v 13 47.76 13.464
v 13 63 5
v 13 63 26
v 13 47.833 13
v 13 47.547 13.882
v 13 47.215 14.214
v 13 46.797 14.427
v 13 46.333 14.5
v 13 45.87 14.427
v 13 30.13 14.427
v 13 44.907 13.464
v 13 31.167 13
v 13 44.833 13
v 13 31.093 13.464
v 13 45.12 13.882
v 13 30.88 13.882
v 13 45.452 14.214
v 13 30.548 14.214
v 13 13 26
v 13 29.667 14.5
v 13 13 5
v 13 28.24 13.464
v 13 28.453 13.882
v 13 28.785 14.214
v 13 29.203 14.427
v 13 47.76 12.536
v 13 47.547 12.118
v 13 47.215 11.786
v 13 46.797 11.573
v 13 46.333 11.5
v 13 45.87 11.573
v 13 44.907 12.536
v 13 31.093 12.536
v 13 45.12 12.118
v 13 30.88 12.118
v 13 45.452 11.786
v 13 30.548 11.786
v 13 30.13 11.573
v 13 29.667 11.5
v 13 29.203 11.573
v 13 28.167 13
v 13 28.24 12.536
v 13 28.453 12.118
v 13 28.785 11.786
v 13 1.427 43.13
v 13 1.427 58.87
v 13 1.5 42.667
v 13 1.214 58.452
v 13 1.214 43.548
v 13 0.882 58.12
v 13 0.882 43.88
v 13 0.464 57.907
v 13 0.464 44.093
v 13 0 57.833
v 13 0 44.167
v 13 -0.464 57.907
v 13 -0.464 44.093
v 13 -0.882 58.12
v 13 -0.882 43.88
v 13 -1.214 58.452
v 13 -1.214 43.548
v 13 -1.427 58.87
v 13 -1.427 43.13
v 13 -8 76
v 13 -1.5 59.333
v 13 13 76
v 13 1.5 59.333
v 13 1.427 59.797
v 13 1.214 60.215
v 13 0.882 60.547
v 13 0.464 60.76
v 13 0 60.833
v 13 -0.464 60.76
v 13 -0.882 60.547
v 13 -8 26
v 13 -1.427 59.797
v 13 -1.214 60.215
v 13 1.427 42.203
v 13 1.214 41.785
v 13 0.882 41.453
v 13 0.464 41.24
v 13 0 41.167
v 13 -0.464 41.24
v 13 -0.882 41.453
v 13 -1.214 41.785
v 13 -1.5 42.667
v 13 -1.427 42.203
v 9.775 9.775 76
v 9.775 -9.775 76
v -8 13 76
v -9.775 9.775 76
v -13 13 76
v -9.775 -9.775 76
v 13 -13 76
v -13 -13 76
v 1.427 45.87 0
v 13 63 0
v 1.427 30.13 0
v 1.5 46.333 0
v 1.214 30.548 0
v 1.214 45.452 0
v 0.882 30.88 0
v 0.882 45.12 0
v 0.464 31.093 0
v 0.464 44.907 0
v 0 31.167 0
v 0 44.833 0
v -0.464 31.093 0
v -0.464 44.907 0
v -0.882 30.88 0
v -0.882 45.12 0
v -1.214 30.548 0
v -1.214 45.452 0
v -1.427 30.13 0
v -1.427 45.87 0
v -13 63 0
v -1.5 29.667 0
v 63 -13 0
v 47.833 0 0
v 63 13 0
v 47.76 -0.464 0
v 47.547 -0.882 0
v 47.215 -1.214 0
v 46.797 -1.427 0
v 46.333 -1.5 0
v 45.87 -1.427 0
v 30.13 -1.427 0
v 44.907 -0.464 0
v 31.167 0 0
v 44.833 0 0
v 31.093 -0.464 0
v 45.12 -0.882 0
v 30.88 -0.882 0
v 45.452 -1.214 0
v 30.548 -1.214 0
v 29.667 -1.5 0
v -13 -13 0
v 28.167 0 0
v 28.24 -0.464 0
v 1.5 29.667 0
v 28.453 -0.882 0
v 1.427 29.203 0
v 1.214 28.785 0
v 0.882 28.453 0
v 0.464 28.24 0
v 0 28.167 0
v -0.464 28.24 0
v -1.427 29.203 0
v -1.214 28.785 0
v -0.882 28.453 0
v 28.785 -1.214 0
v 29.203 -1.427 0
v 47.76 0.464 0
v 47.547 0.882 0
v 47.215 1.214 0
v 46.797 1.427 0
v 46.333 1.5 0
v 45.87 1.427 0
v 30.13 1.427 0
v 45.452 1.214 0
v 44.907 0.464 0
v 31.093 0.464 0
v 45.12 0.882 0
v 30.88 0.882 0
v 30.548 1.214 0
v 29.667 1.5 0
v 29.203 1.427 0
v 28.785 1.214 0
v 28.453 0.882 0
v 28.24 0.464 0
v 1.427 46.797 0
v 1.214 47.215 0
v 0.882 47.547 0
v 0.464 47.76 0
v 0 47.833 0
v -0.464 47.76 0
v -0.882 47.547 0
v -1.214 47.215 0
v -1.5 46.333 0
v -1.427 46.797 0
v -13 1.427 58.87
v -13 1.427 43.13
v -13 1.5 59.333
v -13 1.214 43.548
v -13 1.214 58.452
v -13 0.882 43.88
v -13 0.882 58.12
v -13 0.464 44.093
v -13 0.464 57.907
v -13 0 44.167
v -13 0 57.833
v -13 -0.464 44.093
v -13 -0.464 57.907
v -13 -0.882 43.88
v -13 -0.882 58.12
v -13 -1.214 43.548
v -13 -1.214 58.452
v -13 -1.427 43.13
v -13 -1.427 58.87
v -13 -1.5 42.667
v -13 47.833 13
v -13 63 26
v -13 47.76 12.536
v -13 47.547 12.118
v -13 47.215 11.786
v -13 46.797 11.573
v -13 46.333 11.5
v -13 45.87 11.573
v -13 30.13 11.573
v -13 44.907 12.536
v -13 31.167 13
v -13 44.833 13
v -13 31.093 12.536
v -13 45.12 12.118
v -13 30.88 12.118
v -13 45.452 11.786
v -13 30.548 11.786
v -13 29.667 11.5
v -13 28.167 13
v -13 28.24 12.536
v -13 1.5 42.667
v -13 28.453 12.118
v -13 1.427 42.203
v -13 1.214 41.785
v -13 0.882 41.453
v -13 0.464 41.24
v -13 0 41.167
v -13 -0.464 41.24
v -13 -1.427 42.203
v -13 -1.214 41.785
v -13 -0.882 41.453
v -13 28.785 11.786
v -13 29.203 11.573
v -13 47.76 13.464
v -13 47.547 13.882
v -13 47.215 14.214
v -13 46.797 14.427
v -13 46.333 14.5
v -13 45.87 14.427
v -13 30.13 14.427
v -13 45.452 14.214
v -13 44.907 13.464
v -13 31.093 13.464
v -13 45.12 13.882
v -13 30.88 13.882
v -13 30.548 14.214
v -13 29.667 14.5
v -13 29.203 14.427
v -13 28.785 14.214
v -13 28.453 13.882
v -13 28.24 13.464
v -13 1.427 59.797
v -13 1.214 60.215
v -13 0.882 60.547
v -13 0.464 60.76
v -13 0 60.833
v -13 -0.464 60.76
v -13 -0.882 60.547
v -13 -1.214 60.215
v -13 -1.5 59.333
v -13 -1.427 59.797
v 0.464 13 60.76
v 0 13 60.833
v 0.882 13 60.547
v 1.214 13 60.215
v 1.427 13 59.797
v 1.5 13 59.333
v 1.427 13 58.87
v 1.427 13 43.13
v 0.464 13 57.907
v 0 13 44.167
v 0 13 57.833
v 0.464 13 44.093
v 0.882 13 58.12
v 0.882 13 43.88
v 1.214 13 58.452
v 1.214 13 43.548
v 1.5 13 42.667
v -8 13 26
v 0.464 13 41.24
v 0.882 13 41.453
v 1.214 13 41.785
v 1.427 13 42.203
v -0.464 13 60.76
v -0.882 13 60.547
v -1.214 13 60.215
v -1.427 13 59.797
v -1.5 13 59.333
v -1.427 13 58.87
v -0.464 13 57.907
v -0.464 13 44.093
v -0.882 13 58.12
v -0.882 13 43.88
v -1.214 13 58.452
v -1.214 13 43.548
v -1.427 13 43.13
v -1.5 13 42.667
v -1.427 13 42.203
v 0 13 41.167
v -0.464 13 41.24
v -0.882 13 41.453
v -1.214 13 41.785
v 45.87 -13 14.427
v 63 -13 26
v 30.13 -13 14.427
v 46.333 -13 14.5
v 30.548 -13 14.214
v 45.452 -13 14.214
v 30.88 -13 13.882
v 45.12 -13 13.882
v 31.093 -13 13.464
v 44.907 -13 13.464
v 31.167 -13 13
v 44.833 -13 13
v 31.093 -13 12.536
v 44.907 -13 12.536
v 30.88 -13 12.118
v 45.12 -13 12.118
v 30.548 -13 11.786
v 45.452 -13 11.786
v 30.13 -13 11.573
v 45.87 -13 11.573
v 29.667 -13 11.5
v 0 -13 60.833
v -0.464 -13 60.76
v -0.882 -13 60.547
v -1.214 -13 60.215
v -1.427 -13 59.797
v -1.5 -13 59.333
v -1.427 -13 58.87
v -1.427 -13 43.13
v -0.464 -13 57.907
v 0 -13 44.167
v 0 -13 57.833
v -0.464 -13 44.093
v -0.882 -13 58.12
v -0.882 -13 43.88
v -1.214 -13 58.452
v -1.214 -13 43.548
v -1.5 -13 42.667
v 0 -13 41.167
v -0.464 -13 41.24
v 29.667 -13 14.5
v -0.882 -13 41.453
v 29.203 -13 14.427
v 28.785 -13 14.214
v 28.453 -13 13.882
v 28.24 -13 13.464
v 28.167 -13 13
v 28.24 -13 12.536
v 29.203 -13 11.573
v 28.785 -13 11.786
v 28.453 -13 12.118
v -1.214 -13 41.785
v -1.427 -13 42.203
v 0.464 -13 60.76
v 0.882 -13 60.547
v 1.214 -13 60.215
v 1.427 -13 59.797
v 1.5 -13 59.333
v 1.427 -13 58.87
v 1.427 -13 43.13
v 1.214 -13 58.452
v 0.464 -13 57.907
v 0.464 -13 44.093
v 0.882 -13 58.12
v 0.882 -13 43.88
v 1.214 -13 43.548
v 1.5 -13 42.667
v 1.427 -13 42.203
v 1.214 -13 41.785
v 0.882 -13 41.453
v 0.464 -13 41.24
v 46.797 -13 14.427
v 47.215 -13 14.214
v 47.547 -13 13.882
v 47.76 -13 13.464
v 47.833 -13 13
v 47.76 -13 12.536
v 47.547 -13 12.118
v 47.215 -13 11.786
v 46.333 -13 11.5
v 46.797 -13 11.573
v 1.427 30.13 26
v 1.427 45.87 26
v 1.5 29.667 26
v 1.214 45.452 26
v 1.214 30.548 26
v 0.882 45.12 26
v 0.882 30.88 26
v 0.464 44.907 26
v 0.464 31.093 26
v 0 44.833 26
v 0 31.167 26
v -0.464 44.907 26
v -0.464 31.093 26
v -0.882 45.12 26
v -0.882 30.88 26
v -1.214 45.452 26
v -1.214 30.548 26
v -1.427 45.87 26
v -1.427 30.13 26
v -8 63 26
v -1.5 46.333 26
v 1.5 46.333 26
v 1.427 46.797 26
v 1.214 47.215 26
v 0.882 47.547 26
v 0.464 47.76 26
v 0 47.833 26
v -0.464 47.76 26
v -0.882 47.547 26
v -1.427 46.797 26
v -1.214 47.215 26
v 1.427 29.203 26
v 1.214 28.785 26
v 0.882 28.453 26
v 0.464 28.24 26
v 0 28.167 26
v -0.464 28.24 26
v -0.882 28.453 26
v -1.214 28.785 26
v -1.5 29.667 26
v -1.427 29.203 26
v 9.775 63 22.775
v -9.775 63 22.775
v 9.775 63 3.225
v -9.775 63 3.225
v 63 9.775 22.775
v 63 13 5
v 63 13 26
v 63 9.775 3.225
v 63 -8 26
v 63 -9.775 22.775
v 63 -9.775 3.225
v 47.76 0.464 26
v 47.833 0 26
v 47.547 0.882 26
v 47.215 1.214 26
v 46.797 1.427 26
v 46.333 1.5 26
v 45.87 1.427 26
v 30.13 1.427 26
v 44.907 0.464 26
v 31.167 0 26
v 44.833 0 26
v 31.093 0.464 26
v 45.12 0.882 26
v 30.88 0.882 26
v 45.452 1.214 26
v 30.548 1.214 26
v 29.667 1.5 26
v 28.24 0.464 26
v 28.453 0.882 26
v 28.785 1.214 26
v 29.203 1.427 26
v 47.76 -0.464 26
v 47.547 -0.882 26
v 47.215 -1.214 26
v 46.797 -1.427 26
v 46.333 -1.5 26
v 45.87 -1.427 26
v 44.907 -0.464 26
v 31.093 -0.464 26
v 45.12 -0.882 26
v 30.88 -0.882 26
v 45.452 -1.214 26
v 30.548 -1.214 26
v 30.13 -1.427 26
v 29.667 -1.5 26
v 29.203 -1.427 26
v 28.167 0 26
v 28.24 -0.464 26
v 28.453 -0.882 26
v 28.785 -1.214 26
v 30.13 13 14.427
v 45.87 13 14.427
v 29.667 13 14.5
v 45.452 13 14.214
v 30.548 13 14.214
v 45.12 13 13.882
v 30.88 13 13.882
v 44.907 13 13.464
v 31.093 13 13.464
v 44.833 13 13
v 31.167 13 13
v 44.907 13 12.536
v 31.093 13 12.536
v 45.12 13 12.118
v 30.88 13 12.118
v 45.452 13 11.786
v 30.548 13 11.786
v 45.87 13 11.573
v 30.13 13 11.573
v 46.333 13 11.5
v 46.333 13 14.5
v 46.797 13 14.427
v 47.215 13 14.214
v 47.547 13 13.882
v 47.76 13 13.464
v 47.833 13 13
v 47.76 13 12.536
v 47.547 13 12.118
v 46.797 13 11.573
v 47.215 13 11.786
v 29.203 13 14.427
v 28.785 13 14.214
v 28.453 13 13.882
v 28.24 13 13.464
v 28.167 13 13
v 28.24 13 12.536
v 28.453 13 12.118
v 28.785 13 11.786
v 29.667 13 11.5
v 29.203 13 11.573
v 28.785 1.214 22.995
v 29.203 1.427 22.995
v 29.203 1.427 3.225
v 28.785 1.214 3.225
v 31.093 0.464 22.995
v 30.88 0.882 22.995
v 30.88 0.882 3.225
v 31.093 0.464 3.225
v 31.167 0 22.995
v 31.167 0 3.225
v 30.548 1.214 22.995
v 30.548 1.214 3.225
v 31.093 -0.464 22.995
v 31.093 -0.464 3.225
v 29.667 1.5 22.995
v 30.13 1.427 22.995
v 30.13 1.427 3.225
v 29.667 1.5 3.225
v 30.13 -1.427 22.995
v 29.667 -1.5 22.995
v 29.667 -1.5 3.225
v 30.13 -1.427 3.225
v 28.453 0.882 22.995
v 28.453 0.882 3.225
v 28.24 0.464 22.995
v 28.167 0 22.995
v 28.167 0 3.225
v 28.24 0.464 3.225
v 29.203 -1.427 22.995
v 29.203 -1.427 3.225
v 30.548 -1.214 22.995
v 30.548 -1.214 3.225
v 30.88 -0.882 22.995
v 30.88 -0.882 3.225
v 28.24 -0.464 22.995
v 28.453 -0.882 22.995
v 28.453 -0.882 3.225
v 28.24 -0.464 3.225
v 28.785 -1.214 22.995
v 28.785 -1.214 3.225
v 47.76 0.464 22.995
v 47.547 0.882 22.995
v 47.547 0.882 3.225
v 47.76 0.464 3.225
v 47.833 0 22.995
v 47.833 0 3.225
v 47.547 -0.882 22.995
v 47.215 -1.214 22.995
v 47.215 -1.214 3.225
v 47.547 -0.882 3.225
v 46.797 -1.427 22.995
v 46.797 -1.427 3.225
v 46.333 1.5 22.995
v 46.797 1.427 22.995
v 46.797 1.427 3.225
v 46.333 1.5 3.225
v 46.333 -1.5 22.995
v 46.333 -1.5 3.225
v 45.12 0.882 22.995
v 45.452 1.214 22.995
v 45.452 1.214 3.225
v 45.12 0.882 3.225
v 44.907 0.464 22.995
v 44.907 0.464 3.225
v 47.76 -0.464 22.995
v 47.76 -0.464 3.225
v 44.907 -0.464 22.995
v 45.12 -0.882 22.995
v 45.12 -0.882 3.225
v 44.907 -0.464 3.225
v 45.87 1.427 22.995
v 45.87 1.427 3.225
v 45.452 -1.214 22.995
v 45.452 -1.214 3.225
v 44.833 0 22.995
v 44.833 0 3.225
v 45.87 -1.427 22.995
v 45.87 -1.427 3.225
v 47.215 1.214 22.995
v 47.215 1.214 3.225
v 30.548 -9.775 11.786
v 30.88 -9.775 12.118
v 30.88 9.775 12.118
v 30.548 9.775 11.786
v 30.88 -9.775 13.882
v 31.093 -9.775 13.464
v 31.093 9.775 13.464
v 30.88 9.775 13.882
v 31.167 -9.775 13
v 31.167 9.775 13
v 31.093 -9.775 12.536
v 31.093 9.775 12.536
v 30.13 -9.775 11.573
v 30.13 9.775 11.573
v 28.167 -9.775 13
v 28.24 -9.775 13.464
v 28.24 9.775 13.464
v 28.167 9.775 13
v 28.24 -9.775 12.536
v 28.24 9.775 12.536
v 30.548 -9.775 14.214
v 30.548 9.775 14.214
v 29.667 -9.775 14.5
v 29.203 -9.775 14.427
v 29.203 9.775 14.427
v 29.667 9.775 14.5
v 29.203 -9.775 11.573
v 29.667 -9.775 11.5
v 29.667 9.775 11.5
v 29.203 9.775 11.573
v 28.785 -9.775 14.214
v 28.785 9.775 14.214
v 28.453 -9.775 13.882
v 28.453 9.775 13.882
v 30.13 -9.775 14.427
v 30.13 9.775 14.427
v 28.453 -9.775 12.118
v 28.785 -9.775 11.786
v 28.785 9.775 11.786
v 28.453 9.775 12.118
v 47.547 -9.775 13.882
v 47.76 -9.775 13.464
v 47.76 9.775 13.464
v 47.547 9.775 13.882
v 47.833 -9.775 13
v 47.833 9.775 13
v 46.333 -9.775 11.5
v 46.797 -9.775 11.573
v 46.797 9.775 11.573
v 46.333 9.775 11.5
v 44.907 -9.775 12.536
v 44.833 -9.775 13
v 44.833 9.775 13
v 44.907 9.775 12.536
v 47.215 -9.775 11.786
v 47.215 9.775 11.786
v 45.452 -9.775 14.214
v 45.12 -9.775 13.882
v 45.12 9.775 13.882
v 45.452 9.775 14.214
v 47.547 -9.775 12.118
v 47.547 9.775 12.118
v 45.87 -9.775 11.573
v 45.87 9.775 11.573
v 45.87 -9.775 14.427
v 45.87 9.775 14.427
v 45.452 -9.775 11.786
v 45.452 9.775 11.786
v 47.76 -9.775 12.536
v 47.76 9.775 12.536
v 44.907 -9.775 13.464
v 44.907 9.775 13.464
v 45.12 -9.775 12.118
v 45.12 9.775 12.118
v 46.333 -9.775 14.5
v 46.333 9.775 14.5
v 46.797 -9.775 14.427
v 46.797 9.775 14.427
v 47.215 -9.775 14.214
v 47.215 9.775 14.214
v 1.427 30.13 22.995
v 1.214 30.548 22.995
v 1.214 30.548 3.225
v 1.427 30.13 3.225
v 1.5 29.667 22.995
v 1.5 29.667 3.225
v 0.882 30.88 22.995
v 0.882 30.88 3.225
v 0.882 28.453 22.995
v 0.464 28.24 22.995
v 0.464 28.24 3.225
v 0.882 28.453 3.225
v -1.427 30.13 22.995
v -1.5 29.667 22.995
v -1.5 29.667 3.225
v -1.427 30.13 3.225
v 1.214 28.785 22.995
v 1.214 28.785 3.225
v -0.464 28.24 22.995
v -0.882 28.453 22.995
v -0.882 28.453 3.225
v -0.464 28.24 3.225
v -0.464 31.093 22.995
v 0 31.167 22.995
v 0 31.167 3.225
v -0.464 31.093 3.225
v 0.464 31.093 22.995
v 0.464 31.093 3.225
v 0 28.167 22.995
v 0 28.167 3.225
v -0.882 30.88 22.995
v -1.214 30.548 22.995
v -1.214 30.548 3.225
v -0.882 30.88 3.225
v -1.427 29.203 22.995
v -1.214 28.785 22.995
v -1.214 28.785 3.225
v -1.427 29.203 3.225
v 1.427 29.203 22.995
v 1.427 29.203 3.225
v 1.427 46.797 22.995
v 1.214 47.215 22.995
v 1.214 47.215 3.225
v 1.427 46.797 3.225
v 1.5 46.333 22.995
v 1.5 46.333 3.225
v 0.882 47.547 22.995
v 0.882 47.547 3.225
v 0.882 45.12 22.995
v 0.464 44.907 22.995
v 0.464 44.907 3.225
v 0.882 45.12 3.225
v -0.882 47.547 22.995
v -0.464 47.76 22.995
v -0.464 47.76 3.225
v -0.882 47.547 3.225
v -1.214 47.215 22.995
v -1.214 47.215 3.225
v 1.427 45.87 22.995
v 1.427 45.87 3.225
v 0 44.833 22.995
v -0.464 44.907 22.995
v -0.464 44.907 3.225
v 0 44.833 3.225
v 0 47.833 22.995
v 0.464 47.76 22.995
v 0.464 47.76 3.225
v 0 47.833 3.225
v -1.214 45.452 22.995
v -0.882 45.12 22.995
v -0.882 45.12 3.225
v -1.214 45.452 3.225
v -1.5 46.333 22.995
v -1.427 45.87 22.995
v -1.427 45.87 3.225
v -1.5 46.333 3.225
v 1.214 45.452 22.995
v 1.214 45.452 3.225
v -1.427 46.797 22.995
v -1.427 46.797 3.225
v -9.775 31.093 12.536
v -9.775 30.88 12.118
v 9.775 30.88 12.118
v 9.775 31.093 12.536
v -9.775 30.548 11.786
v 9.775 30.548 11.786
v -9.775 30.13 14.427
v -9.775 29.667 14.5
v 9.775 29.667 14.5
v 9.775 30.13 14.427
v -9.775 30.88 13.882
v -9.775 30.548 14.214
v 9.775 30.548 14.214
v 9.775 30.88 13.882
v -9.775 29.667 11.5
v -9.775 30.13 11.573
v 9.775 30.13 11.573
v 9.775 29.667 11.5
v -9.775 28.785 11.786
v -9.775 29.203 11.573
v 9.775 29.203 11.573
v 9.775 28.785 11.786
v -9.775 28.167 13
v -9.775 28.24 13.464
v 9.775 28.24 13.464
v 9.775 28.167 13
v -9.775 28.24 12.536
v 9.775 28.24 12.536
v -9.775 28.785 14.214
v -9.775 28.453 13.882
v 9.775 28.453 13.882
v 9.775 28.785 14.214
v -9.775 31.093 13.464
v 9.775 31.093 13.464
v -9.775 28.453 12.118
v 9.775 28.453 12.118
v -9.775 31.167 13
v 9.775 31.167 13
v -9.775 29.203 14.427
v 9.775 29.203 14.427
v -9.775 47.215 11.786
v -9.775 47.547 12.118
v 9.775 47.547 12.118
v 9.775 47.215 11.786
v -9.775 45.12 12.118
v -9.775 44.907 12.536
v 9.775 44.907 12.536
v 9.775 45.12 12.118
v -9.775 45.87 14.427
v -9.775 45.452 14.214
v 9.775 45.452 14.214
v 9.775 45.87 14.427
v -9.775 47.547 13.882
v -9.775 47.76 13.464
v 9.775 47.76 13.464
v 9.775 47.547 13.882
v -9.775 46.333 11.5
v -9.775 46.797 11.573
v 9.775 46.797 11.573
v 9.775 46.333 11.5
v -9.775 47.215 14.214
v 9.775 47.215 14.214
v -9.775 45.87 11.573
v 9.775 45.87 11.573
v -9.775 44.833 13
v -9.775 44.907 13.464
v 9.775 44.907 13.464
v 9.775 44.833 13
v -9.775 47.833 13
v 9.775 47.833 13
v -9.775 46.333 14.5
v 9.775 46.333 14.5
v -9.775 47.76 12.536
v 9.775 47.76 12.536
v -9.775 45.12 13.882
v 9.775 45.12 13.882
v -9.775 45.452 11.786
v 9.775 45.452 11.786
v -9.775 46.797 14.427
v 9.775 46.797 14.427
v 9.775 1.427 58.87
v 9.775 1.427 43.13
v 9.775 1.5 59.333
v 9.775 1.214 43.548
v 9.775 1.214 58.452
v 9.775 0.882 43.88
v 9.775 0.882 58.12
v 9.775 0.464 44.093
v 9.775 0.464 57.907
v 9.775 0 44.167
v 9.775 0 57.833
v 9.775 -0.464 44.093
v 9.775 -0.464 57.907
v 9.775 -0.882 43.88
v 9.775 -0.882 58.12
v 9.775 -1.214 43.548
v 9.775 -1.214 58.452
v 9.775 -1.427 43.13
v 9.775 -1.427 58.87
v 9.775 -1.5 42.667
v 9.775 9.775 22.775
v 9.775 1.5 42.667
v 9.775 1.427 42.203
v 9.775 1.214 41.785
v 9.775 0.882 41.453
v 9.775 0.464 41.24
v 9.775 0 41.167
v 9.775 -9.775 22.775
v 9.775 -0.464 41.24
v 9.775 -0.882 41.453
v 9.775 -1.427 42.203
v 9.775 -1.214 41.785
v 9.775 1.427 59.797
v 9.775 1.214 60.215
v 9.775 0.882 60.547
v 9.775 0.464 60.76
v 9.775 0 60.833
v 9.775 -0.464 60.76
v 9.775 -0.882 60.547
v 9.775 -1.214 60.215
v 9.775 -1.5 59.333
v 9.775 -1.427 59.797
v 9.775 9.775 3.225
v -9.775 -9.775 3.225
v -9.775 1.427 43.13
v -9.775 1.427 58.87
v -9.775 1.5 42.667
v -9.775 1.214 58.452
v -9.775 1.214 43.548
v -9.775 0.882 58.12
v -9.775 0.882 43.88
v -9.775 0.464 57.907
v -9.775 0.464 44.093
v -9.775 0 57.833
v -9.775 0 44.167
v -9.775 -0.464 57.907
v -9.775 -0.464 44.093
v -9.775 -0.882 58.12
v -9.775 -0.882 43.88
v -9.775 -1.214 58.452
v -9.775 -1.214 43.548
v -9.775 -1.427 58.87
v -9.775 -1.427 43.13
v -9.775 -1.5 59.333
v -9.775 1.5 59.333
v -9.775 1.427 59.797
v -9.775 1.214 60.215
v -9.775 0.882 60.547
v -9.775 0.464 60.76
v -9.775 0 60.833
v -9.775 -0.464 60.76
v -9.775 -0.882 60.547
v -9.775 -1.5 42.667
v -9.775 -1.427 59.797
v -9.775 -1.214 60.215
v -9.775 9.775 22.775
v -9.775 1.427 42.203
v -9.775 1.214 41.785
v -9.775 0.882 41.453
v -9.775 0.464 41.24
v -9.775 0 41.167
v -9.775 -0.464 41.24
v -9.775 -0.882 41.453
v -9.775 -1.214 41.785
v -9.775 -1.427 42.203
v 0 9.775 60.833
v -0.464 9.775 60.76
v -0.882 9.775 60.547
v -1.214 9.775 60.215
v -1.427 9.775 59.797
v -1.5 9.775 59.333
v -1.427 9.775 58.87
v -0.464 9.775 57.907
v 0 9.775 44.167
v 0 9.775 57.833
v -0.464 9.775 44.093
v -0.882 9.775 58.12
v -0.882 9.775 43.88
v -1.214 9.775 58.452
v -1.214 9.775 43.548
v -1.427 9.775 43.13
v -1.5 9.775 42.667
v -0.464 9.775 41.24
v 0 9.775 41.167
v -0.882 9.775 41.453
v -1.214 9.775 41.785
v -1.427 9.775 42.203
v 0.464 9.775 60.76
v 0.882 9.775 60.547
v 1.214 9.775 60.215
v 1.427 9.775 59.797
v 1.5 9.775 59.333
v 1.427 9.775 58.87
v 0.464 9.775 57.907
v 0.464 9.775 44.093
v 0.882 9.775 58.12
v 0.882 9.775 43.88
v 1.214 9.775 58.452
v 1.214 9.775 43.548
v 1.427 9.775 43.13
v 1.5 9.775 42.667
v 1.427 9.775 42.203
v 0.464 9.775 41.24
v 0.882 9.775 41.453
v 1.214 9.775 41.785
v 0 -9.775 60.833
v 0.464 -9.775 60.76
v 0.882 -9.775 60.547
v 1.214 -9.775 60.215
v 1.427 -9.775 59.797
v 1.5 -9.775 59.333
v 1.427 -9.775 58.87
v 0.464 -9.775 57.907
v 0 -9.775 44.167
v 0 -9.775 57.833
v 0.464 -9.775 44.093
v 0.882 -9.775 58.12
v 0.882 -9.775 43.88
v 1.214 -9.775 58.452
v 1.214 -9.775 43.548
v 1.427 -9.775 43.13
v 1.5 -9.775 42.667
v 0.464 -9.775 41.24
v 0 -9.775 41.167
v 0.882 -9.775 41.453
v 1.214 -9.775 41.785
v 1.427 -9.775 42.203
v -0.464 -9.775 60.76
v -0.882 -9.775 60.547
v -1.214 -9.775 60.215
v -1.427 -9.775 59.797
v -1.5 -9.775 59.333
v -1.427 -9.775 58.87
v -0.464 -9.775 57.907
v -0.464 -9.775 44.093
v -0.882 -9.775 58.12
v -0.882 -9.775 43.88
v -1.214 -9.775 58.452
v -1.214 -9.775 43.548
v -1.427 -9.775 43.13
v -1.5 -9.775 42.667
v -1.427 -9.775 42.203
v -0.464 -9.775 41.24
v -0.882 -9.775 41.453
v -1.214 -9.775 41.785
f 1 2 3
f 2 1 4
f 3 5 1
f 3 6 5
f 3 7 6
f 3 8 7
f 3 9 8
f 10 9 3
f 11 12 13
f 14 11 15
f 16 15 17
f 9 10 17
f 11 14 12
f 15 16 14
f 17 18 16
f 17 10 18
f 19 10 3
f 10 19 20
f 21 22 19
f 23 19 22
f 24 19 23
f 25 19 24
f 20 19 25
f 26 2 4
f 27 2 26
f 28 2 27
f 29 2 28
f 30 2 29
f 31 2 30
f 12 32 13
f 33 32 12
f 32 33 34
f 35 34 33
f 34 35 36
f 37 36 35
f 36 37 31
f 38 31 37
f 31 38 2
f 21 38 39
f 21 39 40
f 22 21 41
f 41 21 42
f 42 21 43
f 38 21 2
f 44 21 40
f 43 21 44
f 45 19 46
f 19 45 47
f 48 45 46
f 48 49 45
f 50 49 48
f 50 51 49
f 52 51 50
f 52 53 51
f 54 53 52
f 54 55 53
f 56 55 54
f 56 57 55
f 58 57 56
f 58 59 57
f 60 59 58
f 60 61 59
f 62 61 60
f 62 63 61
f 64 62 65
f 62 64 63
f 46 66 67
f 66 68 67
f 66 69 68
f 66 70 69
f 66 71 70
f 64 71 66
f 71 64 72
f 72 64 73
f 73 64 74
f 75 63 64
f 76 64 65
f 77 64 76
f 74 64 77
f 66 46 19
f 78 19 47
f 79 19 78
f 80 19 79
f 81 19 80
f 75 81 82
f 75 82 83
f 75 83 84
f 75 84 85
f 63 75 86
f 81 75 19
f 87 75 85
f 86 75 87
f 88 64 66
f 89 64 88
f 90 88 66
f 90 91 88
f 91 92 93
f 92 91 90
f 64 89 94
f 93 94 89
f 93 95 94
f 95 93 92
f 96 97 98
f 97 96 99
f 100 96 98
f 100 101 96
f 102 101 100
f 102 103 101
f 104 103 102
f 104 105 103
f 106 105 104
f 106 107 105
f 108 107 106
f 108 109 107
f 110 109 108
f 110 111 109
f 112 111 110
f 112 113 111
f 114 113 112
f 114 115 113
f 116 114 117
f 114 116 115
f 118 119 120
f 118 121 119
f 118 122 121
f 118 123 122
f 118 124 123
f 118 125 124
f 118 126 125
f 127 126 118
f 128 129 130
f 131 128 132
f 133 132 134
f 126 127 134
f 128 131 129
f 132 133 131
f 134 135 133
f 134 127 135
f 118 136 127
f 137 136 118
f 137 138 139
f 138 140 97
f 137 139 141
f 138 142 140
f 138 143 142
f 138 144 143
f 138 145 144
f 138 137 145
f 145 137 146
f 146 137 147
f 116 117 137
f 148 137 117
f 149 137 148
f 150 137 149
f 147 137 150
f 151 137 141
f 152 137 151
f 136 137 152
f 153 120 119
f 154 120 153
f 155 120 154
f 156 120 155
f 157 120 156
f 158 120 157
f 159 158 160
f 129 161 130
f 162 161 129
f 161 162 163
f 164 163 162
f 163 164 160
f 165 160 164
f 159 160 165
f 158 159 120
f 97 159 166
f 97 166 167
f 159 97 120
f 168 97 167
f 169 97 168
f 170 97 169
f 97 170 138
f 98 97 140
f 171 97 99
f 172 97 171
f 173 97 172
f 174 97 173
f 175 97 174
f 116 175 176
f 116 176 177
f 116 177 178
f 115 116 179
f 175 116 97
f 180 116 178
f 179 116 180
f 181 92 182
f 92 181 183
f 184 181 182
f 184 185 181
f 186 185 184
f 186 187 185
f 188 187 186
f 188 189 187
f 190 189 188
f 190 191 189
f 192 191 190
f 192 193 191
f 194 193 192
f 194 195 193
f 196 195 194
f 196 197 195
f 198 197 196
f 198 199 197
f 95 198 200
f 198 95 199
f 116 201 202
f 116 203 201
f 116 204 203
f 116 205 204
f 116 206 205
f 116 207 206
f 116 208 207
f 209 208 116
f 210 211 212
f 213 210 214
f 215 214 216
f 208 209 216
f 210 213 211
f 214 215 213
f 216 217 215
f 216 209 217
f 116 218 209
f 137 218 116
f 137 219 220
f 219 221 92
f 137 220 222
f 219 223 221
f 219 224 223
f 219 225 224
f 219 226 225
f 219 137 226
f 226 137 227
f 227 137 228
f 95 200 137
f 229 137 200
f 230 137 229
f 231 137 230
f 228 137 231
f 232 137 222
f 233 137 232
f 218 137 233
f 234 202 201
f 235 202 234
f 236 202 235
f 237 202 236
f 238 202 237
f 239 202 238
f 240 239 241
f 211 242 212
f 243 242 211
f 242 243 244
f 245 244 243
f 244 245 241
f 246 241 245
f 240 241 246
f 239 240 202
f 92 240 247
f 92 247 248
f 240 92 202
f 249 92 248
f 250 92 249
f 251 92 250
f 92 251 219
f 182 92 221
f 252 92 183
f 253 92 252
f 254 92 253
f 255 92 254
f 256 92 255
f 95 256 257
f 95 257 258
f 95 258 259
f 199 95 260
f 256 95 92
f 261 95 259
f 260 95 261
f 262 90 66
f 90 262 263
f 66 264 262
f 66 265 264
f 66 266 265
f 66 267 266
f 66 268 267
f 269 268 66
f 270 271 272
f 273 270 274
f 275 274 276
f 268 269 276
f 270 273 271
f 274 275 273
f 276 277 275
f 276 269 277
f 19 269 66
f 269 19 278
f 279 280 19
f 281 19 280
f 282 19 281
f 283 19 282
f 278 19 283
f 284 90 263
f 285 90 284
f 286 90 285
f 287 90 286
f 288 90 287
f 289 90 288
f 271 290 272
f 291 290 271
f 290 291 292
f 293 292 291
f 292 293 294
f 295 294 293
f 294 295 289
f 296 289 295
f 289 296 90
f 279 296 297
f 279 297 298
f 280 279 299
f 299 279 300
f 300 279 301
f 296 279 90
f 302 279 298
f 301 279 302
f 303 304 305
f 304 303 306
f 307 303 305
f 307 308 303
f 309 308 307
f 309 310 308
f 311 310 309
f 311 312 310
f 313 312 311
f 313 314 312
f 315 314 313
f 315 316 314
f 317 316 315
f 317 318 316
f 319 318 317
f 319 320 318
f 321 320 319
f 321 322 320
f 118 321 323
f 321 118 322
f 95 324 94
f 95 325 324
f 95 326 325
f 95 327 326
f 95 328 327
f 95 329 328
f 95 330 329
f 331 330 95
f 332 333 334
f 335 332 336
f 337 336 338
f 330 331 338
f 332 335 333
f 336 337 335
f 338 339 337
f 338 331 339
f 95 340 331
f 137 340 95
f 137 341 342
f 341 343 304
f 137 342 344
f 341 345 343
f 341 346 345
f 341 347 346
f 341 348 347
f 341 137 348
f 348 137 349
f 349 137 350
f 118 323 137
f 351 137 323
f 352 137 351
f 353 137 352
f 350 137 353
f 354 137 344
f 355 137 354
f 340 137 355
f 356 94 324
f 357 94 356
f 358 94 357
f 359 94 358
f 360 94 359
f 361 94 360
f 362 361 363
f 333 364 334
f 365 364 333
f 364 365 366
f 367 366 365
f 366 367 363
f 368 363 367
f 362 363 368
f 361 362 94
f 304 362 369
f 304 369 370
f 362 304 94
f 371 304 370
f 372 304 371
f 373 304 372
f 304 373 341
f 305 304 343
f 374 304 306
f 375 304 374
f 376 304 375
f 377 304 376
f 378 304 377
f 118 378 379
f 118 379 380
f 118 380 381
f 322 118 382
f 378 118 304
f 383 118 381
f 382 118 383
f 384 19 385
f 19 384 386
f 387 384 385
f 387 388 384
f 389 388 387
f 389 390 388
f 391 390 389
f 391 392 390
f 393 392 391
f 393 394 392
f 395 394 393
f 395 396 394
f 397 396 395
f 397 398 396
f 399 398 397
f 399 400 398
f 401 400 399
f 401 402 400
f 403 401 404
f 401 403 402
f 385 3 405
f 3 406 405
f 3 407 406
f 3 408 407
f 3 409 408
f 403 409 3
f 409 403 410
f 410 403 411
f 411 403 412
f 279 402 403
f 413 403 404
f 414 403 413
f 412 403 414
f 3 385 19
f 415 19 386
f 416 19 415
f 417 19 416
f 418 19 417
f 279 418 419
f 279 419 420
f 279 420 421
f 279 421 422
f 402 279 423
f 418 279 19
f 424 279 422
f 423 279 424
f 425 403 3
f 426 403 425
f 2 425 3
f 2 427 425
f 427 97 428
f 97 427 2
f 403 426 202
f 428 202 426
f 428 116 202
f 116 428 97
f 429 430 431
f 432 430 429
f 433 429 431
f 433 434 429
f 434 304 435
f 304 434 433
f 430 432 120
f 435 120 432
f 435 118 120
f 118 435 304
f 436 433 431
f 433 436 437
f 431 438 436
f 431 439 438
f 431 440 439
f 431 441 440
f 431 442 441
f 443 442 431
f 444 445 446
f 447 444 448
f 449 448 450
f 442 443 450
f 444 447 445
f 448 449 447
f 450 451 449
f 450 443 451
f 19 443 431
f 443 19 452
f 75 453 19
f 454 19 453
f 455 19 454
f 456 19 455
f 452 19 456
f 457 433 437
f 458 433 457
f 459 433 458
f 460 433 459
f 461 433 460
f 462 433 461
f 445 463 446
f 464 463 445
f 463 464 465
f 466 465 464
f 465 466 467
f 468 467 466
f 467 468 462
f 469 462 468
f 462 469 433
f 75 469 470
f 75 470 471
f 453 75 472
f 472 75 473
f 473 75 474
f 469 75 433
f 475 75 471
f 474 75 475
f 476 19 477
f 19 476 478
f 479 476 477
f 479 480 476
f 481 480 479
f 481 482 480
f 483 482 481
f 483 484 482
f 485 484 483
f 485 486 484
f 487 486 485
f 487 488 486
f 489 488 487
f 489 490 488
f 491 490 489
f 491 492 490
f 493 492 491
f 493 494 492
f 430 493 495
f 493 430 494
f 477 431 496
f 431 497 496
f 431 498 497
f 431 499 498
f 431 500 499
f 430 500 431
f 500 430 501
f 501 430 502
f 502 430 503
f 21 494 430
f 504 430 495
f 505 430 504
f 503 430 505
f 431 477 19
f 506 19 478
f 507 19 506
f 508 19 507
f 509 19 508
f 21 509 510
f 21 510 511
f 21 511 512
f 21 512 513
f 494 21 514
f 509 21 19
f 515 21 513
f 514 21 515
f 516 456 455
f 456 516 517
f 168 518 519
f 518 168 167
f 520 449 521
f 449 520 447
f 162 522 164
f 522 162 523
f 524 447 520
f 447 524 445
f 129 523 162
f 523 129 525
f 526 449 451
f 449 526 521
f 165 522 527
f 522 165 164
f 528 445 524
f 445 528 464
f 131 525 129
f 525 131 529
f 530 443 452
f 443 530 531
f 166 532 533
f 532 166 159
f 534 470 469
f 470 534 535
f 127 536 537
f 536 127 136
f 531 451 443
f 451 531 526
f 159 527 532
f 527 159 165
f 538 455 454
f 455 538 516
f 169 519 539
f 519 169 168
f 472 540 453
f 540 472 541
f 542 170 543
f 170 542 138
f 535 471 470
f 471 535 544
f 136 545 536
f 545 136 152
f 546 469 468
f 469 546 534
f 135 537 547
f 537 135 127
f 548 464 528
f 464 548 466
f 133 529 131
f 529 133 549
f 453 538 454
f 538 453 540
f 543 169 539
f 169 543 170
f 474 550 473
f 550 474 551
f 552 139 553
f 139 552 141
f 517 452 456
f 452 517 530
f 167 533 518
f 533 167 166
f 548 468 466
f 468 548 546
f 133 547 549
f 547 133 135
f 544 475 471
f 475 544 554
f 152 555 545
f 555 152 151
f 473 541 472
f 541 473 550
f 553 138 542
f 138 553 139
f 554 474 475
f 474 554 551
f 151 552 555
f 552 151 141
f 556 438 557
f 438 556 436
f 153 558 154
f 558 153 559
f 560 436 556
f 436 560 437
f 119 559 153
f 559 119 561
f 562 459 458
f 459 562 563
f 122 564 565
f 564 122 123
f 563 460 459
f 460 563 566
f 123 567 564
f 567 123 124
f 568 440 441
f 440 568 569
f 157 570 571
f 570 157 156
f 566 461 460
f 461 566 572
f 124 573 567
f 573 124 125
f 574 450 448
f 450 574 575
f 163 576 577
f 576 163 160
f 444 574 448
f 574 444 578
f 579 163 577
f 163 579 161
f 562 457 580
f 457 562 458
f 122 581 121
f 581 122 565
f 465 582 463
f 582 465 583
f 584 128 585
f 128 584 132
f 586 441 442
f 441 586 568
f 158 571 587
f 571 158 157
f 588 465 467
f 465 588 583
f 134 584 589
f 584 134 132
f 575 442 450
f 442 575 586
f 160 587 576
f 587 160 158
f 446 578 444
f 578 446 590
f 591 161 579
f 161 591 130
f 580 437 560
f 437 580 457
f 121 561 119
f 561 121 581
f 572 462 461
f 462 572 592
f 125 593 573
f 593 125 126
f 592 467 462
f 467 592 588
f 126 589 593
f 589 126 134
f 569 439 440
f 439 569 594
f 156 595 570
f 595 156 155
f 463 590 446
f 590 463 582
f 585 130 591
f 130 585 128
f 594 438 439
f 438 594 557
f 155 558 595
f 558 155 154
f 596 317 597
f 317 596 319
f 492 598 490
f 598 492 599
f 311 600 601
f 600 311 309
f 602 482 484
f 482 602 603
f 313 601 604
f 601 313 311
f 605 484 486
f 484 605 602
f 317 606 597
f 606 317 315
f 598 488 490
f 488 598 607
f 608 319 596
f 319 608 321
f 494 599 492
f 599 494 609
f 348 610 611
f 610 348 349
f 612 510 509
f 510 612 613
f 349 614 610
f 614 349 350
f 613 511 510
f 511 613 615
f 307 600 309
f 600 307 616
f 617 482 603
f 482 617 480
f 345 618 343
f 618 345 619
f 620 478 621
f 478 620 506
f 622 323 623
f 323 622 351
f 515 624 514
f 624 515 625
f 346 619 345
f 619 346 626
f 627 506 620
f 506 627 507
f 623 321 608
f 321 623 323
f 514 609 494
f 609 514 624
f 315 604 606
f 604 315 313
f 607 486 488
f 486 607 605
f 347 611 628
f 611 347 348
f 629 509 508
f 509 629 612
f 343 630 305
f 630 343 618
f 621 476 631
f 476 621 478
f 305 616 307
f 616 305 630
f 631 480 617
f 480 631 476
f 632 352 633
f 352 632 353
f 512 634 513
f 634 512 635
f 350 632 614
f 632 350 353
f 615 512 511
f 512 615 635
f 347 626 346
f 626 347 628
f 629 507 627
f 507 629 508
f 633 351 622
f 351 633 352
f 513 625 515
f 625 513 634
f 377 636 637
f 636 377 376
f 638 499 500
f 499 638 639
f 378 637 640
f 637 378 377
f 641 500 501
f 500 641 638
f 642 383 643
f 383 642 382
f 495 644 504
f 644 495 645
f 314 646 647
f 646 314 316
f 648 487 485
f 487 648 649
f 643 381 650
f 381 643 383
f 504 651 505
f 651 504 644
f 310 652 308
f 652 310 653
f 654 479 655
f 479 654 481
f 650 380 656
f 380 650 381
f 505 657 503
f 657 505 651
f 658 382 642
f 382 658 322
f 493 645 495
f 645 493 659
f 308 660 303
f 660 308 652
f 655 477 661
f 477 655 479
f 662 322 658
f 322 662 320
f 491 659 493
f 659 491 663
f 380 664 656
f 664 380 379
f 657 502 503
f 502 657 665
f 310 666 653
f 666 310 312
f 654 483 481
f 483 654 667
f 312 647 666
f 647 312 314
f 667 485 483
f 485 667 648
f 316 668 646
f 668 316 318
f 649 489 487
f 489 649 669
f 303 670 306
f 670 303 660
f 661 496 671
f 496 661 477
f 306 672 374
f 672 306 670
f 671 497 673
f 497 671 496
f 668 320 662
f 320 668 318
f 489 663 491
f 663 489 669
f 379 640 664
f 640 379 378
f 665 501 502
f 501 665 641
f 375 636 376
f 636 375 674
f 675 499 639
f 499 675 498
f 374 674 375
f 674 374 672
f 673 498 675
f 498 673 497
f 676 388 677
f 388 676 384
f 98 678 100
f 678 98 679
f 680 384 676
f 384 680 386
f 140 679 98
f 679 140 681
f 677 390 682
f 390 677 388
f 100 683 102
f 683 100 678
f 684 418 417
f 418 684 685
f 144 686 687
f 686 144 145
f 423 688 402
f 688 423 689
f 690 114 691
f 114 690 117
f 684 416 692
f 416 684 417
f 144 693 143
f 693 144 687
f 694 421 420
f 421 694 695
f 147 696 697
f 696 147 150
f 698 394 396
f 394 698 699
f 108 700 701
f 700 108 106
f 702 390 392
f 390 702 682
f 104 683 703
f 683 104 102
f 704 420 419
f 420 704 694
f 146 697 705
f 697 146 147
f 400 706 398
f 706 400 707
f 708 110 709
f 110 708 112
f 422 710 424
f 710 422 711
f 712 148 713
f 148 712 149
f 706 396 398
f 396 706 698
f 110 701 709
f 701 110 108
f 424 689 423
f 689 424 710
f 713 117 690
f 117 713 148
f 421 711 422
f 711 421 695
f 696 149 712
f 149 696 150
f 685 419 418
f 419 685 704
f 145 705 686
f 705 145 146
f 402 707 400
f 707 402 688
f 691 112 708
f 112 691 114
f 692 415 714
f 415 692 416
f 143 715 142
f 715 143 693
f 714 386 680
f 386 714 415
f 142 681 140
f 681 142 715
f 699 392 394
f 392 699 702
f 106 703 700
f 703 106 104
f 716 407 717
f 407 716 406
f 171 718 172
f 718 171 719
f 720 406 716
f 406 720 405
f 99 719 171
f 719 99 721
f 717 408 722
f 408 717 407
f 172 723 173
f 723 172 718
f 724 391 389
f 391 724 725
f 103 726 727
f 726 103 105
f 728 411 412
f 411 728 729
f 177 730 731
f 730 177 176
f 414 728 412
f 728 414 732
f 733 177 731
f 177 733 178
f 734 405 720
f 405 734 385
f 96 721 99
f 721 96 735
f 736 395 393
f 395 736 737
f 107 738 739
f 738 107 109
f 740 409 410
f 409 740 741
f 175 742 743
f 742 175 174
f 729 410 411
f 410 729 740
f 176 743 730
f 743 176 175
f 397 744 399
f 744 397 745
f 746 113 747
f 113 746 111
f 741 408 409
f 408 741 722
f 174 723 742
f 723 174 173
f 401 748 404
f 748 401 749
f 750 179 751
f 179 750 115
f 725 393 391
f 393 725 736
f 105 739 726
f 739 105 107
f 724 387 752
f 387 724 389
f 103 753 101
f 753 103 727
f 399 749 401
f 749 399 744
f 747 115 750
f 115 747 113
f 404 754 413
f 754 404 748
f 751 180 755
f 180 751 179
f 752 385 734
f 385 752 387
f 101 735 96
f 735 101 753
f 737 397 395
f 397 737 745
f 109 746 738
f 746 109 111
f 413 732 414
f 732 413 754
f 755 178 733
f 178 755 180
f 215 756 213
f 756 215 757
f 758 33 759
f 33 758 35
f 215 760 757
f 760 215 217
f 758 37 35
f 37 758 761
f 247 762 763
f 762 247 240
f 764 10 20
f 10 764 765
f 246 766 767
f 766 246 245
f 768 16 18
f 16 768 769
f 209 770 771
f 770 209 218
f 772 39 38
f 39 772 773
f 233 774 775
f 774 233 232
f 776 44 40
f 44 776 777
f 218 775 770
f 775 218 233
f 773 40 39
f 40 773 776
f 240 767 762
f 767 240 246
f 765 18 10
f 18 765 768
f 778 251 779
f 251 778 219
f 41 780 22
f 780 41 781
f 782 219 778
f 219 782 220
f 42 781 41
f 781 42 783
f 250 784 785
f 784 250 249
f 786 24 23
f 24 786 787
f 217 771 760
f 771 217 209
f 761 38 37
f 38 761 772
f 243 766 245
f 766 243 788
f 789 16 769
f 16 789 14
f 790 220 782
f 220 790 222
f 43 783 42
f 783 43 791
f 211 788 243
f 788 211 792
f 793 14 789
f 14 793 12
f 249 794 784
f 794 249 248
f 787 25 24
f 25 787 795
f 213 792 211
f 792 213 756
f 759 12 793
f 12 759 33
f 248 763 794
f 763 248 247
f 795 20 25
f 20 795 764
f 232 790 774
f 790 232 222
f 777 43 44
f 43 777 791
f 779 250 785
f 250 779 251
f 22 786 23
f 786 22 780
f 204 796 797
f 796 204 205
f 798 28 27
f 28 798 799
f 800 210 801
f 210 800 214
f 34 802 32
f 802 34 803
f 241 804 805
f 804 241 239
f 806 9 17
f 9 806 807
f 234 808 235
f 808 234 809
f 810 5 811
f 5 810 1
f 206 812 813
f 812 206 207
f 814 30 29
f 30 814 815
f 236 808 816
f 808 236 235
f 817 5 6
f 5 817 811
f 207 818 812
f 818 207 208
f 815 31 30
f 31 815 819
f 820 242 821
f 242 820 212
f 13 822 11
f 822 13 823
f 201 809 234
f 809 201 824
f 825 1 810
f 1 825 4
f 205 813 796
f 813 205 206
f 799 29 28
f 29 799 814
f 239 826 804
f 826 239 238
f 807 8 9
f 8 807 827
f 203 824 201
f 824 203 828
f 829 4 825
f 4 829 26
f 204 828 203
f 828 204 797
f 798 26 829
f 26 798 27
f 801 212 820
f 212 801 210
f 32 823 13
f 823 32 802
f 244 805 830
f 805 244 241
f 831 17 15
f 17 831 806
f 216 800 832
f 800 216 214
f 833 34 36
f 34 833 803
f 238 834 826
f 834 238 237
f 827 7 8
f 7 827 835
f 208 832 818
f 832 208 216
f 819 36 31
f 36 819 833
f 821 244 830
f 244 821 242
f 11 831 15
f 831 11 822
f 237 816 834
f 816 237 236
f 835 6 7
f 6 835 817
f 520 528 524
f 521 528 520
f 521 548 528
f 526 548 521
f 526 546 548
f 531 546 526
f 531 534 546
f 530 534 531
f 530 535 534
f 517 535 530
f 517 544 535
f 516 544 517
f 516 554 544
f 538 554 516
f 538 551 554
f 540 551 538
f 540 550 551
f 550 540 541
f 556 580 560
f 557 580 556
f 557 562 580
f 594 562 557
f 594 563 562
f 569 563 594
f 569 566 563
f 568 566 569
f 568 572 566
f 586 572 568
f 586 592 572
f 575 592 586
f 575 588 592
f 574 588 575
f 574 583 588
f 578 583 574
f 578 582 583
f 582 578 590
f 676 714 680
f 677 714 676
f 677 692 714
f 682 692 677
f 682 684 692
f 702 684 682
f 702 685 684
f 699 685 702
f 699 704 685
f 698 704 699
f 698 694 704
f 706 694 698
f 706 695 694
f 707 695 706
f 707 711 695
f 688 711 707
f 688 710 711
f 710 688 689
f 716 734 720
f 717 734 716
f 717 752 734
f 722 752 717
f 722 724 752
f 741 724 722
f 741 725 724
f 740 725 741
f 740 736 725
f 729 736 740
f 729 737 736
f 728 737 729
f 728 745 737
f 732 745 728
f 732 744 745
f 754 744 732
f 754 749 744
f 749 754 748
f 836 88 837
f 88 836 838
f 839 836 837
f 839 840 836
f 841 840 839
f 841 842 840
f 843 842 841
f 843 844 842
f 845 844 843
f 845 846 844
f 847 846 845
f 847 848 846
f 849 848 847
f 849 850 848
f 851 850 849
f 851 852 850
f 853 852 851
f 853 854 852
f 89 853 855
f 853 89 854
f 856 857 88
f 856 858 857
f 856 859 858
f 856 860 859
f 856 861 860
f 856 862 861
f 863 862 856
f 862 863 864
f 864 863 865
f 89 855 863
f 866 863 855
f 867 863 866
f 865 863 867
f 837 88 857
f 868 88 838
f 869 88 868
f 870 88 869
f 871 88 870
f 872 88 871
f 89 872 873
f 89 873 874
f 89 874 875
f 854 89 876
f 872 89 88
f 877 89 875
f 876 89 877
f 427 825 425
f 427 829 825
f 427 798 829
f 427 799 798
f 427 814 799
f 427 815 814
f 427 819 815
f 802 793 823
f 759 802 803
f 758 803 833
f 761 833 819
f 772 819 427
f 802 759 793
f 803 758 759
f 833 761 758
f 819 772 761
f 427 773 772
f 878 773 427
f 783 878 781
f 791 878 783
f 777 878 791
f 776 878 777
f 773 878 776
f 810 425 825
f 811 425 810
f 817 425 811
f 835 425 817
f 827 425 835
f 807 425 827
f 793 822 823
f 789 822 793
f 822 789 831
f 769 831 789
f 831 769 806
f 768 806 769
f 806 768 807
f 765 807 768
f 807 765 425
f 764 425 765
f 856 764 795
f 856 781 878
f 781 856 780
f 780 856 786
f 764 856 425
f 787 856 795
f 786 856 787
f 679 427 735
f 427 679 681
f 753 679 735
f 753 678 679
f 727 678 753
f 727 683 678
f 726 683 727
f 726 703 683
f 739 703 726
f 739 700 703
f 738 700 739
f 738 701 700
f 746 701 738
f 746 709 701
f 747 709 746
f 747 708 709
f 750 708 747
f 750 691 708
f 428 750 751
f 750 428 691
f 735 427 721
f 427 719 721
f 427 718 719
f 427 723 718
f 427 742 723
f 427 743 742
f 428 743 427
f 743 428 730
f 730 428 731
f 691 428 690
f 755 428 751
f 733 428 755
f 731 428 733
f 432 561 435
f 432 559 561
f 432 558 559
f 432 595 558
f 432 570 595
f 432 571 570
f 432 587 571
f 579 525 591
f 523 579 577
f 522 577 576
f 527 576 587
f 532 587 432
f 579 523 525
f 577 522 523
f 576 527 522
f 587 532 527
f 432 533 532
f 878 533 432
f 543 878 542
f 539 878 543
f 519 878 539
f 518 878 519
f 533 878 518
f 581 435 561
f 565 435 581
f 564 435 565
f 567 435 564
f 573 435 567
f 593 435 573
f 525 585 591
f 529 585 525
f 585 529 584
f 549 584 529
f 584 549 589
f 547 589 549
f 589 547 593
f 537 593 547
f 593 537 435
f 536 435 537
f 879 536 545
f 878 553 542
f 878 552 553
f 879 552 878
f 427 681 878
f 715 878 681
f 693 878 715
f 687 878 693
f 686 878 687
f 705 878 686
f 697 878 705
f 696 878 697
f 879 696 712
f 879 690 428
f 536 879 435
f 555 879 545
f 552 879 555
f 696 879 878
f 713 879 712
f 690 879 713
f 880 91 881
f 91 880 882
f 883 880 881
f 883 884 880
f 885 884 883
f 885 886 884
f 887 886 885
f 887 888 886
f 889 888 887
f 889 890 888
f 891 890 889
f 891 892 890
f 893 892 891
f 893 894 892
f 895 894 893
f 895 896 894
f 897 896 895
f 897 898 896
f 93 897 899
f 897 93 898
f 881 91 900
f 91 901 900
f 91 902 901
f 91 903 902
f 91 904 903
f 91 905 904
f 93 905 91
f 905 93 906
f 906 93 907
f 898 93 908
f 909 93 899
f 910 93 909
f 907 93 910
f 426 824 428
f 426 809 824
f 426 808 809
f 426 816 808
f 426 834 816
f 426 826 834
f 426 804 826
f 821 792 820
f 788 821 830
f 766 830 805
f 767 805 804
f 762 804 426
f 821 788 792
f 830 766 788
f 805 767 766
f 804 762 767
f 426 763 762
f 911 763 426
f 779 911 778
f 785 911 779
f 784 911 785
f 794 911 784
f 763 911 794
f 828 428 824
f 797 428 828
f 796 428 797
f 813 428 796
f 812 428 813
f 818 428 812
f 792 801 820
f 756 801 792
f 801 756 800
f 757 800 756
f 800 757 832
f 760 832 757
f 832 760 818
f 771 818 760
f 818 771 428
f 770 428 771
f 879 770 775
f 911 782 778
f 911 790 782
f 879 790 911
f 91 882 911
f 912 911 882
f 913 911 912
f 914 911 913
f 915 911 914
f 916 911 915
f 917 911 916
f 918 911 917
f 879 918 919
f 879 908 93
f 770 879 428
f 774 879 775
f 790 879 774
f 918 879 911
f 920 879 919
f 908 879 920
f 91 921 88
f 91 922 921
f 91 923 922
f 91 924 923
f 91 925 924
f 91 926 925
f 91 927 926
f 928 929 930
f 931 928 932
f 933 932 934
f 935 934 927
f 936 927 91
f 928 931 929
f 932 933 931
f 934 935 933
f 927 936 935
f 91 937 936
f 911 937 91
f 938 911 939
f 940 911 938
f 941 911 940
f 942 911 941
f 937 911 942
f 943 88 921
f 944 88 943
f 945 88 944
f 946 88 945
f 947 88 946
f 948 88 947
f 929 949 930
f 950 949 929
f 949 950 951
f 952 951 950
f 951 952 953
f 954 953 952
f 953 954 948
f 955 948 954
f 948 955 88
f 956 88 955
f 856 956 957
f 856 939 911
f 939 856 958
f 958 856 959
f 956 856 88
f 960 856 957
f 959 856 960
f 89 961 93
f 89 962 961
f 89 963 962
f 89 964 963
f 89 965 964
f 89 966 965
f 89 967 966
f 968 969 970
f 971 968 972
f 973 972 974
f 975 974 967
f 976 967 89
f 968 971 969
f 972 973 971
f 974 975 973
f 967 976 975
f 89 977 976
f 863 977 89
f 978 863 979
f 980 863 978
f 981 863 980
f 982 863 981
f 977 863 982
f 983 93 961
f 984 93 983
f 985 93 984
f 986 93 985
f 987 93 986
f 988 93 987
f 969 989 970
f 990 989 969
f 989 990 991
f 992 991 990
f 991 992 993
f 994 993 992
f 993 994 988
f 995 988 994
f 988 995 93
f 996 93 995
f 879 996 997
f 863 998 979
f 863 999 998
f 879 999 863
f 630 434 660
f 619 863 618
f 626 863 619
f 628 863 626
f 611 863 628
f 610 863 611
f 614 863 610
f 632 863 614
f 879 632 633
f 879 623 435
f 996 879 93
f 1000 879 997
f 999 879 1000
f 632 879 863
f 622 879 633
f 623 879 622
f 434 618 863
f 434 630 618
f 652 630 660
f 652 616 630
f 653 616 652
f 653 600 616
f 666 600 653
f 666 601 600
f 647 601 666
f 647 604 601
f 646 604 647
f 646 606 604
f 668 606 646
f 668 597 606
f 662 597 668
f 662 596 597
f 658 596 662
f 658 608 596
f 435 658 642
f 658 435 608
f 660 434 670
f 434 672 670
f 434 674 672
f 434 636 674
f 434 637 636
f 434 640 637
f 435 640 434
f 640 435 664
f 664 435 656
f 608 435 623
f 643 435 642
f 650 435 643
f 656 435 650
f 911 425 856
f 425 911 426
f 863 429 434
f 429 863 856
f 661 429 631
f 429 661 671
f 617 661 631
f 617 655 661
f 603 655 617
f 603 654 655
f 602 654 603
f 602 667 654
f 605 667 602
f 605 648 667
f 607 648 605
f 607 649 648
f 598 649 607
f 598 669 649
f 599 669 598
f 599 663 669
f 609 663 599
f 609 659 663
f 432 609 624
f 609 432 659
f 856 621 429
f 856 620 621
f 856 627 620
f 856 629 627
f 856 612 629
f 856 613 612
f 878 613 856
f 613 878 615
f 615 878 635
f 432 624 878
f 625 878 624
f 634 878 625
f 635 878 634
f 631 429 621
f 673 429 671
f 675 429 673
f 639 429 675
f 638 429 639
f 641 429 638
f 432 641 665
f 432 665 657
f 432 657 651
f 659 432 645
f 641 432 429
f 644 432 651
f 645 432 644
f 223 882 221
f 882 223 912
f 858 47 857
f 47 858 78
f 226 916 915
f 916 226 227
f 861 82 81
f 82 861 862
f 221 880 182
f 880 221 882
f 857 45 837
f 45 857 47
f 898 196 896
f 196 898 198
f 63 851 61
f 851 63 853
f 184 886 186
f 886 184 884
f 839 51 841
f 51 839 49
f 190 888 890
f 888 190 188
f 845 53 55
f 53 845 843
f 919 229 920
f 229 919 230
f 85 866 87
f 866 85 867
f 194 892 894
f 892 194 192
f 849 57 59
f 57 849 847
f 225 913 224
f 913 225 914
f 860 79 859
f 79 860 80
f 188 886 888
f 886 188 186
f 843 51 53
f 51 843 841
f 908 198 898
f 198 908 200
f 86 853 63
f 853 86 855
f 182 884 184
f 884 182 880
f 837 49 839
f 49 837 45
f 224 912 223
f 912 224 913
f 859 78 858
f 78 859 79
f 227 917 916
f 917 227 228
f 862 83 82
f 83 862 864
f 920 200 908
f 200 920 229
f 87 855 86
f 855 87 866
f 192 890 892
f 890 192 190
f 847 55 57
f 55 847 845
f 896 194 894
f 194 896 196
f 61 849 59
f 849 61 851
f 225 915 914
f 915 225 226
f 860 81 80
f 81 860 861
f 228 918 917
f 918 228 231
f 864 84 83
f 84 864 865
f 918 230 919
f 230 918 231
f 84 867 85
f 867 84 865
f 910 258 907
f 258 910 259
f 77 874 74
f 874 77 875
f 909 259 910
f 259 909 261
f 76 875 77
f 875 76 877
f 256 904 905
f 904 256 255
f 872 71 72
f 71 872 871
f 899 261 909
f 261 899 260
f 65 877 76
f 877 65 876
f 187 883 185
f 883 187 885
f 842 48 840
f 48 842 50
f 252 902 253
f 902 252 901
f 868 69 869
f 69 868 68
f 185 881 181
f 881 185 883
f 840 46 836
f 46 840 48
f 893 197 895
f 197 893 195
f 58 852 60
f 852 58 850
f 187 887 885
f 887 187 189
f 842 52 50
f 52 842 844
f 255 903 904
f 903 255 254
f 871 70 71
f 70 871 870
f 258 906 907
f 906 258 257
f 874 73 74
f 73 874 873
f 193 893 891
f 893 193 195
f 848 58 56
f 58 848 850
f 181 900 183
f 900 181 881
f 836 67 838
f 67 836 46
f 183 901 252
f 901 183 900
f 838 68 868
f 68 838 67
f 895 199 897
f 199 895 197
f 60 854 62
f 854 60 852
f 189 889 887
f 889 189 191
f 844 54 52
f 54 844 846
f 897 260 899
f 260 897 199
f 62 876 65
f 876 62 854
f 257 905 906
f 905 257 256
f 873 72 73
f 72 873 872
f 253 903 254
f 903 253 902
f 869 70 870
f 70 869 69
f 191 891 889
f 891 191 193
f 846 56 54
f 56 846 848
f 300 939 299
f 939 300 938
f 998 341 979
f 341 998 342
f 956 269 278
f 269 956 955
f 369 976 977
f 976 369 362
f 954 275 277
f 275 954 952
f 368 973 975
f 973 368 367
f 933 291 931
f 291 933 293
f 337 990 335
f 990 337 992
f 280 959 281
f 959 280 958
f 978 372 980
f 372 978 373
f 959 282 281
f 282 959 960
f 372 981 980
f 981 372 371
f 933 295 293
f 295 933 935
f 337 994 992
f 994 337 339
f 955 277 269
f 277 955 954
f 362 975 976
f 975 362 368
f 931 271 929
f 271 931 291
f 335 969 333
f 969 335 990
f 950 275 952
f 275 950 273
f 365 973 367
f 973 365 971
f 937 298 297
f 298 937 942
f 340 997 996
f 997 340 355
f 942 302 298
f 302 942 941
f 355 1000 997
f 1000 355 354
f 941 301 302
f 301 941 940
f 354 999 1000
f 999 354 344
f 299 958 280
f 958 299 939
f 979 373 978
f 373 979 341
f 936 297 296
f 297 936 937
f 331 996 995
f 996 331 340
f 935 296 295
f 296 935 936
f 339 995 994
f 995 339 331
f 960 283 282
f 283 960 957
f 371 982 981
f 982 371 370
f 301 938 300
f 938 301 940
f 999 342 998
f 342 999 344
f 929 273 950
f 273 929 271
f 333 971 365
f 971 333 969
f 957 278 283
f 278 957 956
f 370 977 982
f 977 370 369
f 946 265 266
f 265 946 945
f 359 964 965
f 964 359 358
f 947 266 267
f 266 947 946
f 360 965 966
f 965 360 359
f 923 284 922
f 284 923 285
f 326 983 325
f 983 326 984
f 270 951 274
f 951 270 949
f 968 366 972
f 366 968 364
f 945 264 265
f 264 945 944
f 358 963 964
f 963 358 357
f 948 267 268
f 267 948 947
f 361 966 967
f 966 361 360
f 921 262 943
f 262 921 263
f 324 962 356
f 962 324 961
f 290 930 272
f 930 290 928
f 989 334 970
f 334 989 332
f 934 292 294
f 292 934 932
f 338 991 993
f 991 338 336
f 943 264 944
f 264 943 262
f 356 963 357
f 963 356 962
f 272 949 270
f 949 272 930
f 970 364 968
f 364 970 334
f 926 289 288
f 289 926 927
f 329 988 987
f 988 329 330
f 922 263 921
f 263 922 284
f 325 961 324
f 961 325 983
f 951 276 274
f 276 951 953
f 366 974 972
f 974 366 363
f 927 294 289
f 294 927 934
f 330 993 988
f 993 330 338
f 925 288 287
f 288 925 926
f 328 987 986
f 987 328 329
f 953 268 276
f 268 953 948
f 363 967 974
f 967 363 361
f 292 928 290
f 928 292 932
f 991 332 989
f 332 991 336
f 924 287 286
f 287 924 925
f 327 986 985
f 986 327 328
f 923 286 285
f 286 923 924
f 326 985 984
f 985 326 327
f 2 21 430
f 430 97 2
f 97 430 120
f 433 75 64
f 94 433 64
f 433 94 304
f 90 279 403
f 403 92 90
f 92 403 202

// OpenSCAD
// Designed by Nathaniel Stenzel April 21, 2019
// Thing 3577992

$fn=20;

  //////////////////////////
 // Customizer Settings: //
//////////////////////////

// All measurements are in mm.
// How big is the square tube or extrusion?
inner_size=19.55;
// How big do you want the mount to be around the square tube or extrusion?
outer_size=26;
// How much of the square tube or extrusion do you want inserted into this corner bracket?
insertion_depth=50;
// Do you want the vertical tube to have a bottom or do you want it to stick through?
have_bottom=1; // [1:Yes, 0:No]
// How big do you want the screw holes? (0 for none)
screw_size=3;
// How thick do you want the triangular braces? (0 for none)
fin_thickness=5; 
//Layer height which will be used to help add support
support_height=0.22;
//Should I add a thin support layer at the bottom of the horizontal holes?
hole_support=1; // [1:Yes, 0:No]

module fin(height,width,thickness) {
    linear_extrude(height = thickness)
        polygon(points=[[0,0],[0,width],[height,0]]);
}

module corner(inner=0,outer=0,depth=0,bottom=true,add_hole_support=true,layer_height=0,screws=5,fins=5) {
union(){
    //tubes
    difference(){
        
        union() {
            translate([-outer/2,-outer/2,0])cube([outer,outer,outer+depth]); //Z tube
            translate([-outer/2,outer/2,0])cube([outer,depth,outer]); //X tube
            translate([outer/2,-outer/2,0])cube([depth,outer,outer]); //Y tube
        }
        //Z tube void
        if(bottom)
        {
            translate([-inner/2,-inner/2,(outer-inner)/2])cube([inner,inner,outer+depth]); 
            }
        else
        { //cut out the bottom of the Z tube shaft too
            translate([-inner/2,-inner/2,-1])cube([inner,inner,outer+depth+3]);             
        }
        translate([-inner/2,inner/2-1,(outer-inner)/2])cube([inner,depth+outer-inner+4,inner]); //X tube void
        translate([inner/2-1,-inner/2,(outer-inner)/2])cube([depth+outer-inner+4,inner,inner]); //Y tube void

        //Z tube shaft screw holes
        translate([0,0,depth/3+outer])rotate([0,-90,0])cylinder(d=screws,h=outer+5,center=true);
        translate([0,0,depth*2/3+outer])rotate([0,-90,0])cylinder(d=screws,h=outer+5,center=true);
        translate([0,0,depth/3+outer])rotate([90,0,0])cylinder(d=screws,h=outer+5,center=true);
        translate([0,0,depth*2/3+outer])rotate([90,0,0])cylinder(d=screws,h=outer+5,center=true);
        
        difference() {
            union() {

        //X tube shaft screw holes
                translate([depth/3+outer/2,0,-1])cylinder(d=screws,h=outer+3);
                translate([depth*2/3+outer/2,0,-1])cylinder(d=screws,h=outer+3);
                translate([depth/3+outer/2,0,outer/2])rotate([90,0,0])cylinder(d=screws,h=outer+3,center=true);
                translate([depth*2/3+outer/2,0,outer/2])rotate([90,0,0])cylinder(d=screws,h=outer+3,center=true);

                //Y tube shaft screw holes
                translate([0,depth/3+outer/2,-1])cylinder(d=screws,h=outer+3);
                translate([0,depth*2/3+outer/2,-1])cylinder(d=screws,h=outer+3);
                translate([0,depth/3+outer/2,outer/2])rotate([0,90,0])cylinder(d=screws,h=outer+3,center=true);
                translate([0,depth*2/3+outer/2,outer/2])rotate([0,90,0])cylinder(d=screws,h=outer+3,center=true);
            }
            if (add_hole_support) {
                translate([depth/3+outer/2,0,inner+(outer-inner)/2-1])cylinder(d=screws,h=layer_height+1);
                translate([depth*2/3+outer/2,0,inner+(outer-inner)/2-1])cylinder(d=screws,h=layer_height+1);
                translate([0,depth/3+outer/2,inner+(outer-inner)/2-1])cylinder(d=screws,h=layer_height+1);
                translate([0,depth*2/3+outer/2,inner+(outer-inner)/2-1])cylinder(d=screws,layer_height+1);
            }
        }
 
  }
        
    
    //tube supports  
    translate([outer/2,outer/2,0])fin(depth,depth,fins);
    translate([outer/2,fins-outer/2,outer])rotate([90,0,0])fin(depth,depth,fins);
    translate([fins-outer/2,outer/2,outer])rotate([0,-90,0])fin(depth,depth,fins);
}

}

corner(inner=inner_size,outer=outer_size,depth=insertion_depth,bottom=have_bottom,add_hole_support=hole_support,layer_height=support_height,screws=screw_size,fins=fin_thickness);
